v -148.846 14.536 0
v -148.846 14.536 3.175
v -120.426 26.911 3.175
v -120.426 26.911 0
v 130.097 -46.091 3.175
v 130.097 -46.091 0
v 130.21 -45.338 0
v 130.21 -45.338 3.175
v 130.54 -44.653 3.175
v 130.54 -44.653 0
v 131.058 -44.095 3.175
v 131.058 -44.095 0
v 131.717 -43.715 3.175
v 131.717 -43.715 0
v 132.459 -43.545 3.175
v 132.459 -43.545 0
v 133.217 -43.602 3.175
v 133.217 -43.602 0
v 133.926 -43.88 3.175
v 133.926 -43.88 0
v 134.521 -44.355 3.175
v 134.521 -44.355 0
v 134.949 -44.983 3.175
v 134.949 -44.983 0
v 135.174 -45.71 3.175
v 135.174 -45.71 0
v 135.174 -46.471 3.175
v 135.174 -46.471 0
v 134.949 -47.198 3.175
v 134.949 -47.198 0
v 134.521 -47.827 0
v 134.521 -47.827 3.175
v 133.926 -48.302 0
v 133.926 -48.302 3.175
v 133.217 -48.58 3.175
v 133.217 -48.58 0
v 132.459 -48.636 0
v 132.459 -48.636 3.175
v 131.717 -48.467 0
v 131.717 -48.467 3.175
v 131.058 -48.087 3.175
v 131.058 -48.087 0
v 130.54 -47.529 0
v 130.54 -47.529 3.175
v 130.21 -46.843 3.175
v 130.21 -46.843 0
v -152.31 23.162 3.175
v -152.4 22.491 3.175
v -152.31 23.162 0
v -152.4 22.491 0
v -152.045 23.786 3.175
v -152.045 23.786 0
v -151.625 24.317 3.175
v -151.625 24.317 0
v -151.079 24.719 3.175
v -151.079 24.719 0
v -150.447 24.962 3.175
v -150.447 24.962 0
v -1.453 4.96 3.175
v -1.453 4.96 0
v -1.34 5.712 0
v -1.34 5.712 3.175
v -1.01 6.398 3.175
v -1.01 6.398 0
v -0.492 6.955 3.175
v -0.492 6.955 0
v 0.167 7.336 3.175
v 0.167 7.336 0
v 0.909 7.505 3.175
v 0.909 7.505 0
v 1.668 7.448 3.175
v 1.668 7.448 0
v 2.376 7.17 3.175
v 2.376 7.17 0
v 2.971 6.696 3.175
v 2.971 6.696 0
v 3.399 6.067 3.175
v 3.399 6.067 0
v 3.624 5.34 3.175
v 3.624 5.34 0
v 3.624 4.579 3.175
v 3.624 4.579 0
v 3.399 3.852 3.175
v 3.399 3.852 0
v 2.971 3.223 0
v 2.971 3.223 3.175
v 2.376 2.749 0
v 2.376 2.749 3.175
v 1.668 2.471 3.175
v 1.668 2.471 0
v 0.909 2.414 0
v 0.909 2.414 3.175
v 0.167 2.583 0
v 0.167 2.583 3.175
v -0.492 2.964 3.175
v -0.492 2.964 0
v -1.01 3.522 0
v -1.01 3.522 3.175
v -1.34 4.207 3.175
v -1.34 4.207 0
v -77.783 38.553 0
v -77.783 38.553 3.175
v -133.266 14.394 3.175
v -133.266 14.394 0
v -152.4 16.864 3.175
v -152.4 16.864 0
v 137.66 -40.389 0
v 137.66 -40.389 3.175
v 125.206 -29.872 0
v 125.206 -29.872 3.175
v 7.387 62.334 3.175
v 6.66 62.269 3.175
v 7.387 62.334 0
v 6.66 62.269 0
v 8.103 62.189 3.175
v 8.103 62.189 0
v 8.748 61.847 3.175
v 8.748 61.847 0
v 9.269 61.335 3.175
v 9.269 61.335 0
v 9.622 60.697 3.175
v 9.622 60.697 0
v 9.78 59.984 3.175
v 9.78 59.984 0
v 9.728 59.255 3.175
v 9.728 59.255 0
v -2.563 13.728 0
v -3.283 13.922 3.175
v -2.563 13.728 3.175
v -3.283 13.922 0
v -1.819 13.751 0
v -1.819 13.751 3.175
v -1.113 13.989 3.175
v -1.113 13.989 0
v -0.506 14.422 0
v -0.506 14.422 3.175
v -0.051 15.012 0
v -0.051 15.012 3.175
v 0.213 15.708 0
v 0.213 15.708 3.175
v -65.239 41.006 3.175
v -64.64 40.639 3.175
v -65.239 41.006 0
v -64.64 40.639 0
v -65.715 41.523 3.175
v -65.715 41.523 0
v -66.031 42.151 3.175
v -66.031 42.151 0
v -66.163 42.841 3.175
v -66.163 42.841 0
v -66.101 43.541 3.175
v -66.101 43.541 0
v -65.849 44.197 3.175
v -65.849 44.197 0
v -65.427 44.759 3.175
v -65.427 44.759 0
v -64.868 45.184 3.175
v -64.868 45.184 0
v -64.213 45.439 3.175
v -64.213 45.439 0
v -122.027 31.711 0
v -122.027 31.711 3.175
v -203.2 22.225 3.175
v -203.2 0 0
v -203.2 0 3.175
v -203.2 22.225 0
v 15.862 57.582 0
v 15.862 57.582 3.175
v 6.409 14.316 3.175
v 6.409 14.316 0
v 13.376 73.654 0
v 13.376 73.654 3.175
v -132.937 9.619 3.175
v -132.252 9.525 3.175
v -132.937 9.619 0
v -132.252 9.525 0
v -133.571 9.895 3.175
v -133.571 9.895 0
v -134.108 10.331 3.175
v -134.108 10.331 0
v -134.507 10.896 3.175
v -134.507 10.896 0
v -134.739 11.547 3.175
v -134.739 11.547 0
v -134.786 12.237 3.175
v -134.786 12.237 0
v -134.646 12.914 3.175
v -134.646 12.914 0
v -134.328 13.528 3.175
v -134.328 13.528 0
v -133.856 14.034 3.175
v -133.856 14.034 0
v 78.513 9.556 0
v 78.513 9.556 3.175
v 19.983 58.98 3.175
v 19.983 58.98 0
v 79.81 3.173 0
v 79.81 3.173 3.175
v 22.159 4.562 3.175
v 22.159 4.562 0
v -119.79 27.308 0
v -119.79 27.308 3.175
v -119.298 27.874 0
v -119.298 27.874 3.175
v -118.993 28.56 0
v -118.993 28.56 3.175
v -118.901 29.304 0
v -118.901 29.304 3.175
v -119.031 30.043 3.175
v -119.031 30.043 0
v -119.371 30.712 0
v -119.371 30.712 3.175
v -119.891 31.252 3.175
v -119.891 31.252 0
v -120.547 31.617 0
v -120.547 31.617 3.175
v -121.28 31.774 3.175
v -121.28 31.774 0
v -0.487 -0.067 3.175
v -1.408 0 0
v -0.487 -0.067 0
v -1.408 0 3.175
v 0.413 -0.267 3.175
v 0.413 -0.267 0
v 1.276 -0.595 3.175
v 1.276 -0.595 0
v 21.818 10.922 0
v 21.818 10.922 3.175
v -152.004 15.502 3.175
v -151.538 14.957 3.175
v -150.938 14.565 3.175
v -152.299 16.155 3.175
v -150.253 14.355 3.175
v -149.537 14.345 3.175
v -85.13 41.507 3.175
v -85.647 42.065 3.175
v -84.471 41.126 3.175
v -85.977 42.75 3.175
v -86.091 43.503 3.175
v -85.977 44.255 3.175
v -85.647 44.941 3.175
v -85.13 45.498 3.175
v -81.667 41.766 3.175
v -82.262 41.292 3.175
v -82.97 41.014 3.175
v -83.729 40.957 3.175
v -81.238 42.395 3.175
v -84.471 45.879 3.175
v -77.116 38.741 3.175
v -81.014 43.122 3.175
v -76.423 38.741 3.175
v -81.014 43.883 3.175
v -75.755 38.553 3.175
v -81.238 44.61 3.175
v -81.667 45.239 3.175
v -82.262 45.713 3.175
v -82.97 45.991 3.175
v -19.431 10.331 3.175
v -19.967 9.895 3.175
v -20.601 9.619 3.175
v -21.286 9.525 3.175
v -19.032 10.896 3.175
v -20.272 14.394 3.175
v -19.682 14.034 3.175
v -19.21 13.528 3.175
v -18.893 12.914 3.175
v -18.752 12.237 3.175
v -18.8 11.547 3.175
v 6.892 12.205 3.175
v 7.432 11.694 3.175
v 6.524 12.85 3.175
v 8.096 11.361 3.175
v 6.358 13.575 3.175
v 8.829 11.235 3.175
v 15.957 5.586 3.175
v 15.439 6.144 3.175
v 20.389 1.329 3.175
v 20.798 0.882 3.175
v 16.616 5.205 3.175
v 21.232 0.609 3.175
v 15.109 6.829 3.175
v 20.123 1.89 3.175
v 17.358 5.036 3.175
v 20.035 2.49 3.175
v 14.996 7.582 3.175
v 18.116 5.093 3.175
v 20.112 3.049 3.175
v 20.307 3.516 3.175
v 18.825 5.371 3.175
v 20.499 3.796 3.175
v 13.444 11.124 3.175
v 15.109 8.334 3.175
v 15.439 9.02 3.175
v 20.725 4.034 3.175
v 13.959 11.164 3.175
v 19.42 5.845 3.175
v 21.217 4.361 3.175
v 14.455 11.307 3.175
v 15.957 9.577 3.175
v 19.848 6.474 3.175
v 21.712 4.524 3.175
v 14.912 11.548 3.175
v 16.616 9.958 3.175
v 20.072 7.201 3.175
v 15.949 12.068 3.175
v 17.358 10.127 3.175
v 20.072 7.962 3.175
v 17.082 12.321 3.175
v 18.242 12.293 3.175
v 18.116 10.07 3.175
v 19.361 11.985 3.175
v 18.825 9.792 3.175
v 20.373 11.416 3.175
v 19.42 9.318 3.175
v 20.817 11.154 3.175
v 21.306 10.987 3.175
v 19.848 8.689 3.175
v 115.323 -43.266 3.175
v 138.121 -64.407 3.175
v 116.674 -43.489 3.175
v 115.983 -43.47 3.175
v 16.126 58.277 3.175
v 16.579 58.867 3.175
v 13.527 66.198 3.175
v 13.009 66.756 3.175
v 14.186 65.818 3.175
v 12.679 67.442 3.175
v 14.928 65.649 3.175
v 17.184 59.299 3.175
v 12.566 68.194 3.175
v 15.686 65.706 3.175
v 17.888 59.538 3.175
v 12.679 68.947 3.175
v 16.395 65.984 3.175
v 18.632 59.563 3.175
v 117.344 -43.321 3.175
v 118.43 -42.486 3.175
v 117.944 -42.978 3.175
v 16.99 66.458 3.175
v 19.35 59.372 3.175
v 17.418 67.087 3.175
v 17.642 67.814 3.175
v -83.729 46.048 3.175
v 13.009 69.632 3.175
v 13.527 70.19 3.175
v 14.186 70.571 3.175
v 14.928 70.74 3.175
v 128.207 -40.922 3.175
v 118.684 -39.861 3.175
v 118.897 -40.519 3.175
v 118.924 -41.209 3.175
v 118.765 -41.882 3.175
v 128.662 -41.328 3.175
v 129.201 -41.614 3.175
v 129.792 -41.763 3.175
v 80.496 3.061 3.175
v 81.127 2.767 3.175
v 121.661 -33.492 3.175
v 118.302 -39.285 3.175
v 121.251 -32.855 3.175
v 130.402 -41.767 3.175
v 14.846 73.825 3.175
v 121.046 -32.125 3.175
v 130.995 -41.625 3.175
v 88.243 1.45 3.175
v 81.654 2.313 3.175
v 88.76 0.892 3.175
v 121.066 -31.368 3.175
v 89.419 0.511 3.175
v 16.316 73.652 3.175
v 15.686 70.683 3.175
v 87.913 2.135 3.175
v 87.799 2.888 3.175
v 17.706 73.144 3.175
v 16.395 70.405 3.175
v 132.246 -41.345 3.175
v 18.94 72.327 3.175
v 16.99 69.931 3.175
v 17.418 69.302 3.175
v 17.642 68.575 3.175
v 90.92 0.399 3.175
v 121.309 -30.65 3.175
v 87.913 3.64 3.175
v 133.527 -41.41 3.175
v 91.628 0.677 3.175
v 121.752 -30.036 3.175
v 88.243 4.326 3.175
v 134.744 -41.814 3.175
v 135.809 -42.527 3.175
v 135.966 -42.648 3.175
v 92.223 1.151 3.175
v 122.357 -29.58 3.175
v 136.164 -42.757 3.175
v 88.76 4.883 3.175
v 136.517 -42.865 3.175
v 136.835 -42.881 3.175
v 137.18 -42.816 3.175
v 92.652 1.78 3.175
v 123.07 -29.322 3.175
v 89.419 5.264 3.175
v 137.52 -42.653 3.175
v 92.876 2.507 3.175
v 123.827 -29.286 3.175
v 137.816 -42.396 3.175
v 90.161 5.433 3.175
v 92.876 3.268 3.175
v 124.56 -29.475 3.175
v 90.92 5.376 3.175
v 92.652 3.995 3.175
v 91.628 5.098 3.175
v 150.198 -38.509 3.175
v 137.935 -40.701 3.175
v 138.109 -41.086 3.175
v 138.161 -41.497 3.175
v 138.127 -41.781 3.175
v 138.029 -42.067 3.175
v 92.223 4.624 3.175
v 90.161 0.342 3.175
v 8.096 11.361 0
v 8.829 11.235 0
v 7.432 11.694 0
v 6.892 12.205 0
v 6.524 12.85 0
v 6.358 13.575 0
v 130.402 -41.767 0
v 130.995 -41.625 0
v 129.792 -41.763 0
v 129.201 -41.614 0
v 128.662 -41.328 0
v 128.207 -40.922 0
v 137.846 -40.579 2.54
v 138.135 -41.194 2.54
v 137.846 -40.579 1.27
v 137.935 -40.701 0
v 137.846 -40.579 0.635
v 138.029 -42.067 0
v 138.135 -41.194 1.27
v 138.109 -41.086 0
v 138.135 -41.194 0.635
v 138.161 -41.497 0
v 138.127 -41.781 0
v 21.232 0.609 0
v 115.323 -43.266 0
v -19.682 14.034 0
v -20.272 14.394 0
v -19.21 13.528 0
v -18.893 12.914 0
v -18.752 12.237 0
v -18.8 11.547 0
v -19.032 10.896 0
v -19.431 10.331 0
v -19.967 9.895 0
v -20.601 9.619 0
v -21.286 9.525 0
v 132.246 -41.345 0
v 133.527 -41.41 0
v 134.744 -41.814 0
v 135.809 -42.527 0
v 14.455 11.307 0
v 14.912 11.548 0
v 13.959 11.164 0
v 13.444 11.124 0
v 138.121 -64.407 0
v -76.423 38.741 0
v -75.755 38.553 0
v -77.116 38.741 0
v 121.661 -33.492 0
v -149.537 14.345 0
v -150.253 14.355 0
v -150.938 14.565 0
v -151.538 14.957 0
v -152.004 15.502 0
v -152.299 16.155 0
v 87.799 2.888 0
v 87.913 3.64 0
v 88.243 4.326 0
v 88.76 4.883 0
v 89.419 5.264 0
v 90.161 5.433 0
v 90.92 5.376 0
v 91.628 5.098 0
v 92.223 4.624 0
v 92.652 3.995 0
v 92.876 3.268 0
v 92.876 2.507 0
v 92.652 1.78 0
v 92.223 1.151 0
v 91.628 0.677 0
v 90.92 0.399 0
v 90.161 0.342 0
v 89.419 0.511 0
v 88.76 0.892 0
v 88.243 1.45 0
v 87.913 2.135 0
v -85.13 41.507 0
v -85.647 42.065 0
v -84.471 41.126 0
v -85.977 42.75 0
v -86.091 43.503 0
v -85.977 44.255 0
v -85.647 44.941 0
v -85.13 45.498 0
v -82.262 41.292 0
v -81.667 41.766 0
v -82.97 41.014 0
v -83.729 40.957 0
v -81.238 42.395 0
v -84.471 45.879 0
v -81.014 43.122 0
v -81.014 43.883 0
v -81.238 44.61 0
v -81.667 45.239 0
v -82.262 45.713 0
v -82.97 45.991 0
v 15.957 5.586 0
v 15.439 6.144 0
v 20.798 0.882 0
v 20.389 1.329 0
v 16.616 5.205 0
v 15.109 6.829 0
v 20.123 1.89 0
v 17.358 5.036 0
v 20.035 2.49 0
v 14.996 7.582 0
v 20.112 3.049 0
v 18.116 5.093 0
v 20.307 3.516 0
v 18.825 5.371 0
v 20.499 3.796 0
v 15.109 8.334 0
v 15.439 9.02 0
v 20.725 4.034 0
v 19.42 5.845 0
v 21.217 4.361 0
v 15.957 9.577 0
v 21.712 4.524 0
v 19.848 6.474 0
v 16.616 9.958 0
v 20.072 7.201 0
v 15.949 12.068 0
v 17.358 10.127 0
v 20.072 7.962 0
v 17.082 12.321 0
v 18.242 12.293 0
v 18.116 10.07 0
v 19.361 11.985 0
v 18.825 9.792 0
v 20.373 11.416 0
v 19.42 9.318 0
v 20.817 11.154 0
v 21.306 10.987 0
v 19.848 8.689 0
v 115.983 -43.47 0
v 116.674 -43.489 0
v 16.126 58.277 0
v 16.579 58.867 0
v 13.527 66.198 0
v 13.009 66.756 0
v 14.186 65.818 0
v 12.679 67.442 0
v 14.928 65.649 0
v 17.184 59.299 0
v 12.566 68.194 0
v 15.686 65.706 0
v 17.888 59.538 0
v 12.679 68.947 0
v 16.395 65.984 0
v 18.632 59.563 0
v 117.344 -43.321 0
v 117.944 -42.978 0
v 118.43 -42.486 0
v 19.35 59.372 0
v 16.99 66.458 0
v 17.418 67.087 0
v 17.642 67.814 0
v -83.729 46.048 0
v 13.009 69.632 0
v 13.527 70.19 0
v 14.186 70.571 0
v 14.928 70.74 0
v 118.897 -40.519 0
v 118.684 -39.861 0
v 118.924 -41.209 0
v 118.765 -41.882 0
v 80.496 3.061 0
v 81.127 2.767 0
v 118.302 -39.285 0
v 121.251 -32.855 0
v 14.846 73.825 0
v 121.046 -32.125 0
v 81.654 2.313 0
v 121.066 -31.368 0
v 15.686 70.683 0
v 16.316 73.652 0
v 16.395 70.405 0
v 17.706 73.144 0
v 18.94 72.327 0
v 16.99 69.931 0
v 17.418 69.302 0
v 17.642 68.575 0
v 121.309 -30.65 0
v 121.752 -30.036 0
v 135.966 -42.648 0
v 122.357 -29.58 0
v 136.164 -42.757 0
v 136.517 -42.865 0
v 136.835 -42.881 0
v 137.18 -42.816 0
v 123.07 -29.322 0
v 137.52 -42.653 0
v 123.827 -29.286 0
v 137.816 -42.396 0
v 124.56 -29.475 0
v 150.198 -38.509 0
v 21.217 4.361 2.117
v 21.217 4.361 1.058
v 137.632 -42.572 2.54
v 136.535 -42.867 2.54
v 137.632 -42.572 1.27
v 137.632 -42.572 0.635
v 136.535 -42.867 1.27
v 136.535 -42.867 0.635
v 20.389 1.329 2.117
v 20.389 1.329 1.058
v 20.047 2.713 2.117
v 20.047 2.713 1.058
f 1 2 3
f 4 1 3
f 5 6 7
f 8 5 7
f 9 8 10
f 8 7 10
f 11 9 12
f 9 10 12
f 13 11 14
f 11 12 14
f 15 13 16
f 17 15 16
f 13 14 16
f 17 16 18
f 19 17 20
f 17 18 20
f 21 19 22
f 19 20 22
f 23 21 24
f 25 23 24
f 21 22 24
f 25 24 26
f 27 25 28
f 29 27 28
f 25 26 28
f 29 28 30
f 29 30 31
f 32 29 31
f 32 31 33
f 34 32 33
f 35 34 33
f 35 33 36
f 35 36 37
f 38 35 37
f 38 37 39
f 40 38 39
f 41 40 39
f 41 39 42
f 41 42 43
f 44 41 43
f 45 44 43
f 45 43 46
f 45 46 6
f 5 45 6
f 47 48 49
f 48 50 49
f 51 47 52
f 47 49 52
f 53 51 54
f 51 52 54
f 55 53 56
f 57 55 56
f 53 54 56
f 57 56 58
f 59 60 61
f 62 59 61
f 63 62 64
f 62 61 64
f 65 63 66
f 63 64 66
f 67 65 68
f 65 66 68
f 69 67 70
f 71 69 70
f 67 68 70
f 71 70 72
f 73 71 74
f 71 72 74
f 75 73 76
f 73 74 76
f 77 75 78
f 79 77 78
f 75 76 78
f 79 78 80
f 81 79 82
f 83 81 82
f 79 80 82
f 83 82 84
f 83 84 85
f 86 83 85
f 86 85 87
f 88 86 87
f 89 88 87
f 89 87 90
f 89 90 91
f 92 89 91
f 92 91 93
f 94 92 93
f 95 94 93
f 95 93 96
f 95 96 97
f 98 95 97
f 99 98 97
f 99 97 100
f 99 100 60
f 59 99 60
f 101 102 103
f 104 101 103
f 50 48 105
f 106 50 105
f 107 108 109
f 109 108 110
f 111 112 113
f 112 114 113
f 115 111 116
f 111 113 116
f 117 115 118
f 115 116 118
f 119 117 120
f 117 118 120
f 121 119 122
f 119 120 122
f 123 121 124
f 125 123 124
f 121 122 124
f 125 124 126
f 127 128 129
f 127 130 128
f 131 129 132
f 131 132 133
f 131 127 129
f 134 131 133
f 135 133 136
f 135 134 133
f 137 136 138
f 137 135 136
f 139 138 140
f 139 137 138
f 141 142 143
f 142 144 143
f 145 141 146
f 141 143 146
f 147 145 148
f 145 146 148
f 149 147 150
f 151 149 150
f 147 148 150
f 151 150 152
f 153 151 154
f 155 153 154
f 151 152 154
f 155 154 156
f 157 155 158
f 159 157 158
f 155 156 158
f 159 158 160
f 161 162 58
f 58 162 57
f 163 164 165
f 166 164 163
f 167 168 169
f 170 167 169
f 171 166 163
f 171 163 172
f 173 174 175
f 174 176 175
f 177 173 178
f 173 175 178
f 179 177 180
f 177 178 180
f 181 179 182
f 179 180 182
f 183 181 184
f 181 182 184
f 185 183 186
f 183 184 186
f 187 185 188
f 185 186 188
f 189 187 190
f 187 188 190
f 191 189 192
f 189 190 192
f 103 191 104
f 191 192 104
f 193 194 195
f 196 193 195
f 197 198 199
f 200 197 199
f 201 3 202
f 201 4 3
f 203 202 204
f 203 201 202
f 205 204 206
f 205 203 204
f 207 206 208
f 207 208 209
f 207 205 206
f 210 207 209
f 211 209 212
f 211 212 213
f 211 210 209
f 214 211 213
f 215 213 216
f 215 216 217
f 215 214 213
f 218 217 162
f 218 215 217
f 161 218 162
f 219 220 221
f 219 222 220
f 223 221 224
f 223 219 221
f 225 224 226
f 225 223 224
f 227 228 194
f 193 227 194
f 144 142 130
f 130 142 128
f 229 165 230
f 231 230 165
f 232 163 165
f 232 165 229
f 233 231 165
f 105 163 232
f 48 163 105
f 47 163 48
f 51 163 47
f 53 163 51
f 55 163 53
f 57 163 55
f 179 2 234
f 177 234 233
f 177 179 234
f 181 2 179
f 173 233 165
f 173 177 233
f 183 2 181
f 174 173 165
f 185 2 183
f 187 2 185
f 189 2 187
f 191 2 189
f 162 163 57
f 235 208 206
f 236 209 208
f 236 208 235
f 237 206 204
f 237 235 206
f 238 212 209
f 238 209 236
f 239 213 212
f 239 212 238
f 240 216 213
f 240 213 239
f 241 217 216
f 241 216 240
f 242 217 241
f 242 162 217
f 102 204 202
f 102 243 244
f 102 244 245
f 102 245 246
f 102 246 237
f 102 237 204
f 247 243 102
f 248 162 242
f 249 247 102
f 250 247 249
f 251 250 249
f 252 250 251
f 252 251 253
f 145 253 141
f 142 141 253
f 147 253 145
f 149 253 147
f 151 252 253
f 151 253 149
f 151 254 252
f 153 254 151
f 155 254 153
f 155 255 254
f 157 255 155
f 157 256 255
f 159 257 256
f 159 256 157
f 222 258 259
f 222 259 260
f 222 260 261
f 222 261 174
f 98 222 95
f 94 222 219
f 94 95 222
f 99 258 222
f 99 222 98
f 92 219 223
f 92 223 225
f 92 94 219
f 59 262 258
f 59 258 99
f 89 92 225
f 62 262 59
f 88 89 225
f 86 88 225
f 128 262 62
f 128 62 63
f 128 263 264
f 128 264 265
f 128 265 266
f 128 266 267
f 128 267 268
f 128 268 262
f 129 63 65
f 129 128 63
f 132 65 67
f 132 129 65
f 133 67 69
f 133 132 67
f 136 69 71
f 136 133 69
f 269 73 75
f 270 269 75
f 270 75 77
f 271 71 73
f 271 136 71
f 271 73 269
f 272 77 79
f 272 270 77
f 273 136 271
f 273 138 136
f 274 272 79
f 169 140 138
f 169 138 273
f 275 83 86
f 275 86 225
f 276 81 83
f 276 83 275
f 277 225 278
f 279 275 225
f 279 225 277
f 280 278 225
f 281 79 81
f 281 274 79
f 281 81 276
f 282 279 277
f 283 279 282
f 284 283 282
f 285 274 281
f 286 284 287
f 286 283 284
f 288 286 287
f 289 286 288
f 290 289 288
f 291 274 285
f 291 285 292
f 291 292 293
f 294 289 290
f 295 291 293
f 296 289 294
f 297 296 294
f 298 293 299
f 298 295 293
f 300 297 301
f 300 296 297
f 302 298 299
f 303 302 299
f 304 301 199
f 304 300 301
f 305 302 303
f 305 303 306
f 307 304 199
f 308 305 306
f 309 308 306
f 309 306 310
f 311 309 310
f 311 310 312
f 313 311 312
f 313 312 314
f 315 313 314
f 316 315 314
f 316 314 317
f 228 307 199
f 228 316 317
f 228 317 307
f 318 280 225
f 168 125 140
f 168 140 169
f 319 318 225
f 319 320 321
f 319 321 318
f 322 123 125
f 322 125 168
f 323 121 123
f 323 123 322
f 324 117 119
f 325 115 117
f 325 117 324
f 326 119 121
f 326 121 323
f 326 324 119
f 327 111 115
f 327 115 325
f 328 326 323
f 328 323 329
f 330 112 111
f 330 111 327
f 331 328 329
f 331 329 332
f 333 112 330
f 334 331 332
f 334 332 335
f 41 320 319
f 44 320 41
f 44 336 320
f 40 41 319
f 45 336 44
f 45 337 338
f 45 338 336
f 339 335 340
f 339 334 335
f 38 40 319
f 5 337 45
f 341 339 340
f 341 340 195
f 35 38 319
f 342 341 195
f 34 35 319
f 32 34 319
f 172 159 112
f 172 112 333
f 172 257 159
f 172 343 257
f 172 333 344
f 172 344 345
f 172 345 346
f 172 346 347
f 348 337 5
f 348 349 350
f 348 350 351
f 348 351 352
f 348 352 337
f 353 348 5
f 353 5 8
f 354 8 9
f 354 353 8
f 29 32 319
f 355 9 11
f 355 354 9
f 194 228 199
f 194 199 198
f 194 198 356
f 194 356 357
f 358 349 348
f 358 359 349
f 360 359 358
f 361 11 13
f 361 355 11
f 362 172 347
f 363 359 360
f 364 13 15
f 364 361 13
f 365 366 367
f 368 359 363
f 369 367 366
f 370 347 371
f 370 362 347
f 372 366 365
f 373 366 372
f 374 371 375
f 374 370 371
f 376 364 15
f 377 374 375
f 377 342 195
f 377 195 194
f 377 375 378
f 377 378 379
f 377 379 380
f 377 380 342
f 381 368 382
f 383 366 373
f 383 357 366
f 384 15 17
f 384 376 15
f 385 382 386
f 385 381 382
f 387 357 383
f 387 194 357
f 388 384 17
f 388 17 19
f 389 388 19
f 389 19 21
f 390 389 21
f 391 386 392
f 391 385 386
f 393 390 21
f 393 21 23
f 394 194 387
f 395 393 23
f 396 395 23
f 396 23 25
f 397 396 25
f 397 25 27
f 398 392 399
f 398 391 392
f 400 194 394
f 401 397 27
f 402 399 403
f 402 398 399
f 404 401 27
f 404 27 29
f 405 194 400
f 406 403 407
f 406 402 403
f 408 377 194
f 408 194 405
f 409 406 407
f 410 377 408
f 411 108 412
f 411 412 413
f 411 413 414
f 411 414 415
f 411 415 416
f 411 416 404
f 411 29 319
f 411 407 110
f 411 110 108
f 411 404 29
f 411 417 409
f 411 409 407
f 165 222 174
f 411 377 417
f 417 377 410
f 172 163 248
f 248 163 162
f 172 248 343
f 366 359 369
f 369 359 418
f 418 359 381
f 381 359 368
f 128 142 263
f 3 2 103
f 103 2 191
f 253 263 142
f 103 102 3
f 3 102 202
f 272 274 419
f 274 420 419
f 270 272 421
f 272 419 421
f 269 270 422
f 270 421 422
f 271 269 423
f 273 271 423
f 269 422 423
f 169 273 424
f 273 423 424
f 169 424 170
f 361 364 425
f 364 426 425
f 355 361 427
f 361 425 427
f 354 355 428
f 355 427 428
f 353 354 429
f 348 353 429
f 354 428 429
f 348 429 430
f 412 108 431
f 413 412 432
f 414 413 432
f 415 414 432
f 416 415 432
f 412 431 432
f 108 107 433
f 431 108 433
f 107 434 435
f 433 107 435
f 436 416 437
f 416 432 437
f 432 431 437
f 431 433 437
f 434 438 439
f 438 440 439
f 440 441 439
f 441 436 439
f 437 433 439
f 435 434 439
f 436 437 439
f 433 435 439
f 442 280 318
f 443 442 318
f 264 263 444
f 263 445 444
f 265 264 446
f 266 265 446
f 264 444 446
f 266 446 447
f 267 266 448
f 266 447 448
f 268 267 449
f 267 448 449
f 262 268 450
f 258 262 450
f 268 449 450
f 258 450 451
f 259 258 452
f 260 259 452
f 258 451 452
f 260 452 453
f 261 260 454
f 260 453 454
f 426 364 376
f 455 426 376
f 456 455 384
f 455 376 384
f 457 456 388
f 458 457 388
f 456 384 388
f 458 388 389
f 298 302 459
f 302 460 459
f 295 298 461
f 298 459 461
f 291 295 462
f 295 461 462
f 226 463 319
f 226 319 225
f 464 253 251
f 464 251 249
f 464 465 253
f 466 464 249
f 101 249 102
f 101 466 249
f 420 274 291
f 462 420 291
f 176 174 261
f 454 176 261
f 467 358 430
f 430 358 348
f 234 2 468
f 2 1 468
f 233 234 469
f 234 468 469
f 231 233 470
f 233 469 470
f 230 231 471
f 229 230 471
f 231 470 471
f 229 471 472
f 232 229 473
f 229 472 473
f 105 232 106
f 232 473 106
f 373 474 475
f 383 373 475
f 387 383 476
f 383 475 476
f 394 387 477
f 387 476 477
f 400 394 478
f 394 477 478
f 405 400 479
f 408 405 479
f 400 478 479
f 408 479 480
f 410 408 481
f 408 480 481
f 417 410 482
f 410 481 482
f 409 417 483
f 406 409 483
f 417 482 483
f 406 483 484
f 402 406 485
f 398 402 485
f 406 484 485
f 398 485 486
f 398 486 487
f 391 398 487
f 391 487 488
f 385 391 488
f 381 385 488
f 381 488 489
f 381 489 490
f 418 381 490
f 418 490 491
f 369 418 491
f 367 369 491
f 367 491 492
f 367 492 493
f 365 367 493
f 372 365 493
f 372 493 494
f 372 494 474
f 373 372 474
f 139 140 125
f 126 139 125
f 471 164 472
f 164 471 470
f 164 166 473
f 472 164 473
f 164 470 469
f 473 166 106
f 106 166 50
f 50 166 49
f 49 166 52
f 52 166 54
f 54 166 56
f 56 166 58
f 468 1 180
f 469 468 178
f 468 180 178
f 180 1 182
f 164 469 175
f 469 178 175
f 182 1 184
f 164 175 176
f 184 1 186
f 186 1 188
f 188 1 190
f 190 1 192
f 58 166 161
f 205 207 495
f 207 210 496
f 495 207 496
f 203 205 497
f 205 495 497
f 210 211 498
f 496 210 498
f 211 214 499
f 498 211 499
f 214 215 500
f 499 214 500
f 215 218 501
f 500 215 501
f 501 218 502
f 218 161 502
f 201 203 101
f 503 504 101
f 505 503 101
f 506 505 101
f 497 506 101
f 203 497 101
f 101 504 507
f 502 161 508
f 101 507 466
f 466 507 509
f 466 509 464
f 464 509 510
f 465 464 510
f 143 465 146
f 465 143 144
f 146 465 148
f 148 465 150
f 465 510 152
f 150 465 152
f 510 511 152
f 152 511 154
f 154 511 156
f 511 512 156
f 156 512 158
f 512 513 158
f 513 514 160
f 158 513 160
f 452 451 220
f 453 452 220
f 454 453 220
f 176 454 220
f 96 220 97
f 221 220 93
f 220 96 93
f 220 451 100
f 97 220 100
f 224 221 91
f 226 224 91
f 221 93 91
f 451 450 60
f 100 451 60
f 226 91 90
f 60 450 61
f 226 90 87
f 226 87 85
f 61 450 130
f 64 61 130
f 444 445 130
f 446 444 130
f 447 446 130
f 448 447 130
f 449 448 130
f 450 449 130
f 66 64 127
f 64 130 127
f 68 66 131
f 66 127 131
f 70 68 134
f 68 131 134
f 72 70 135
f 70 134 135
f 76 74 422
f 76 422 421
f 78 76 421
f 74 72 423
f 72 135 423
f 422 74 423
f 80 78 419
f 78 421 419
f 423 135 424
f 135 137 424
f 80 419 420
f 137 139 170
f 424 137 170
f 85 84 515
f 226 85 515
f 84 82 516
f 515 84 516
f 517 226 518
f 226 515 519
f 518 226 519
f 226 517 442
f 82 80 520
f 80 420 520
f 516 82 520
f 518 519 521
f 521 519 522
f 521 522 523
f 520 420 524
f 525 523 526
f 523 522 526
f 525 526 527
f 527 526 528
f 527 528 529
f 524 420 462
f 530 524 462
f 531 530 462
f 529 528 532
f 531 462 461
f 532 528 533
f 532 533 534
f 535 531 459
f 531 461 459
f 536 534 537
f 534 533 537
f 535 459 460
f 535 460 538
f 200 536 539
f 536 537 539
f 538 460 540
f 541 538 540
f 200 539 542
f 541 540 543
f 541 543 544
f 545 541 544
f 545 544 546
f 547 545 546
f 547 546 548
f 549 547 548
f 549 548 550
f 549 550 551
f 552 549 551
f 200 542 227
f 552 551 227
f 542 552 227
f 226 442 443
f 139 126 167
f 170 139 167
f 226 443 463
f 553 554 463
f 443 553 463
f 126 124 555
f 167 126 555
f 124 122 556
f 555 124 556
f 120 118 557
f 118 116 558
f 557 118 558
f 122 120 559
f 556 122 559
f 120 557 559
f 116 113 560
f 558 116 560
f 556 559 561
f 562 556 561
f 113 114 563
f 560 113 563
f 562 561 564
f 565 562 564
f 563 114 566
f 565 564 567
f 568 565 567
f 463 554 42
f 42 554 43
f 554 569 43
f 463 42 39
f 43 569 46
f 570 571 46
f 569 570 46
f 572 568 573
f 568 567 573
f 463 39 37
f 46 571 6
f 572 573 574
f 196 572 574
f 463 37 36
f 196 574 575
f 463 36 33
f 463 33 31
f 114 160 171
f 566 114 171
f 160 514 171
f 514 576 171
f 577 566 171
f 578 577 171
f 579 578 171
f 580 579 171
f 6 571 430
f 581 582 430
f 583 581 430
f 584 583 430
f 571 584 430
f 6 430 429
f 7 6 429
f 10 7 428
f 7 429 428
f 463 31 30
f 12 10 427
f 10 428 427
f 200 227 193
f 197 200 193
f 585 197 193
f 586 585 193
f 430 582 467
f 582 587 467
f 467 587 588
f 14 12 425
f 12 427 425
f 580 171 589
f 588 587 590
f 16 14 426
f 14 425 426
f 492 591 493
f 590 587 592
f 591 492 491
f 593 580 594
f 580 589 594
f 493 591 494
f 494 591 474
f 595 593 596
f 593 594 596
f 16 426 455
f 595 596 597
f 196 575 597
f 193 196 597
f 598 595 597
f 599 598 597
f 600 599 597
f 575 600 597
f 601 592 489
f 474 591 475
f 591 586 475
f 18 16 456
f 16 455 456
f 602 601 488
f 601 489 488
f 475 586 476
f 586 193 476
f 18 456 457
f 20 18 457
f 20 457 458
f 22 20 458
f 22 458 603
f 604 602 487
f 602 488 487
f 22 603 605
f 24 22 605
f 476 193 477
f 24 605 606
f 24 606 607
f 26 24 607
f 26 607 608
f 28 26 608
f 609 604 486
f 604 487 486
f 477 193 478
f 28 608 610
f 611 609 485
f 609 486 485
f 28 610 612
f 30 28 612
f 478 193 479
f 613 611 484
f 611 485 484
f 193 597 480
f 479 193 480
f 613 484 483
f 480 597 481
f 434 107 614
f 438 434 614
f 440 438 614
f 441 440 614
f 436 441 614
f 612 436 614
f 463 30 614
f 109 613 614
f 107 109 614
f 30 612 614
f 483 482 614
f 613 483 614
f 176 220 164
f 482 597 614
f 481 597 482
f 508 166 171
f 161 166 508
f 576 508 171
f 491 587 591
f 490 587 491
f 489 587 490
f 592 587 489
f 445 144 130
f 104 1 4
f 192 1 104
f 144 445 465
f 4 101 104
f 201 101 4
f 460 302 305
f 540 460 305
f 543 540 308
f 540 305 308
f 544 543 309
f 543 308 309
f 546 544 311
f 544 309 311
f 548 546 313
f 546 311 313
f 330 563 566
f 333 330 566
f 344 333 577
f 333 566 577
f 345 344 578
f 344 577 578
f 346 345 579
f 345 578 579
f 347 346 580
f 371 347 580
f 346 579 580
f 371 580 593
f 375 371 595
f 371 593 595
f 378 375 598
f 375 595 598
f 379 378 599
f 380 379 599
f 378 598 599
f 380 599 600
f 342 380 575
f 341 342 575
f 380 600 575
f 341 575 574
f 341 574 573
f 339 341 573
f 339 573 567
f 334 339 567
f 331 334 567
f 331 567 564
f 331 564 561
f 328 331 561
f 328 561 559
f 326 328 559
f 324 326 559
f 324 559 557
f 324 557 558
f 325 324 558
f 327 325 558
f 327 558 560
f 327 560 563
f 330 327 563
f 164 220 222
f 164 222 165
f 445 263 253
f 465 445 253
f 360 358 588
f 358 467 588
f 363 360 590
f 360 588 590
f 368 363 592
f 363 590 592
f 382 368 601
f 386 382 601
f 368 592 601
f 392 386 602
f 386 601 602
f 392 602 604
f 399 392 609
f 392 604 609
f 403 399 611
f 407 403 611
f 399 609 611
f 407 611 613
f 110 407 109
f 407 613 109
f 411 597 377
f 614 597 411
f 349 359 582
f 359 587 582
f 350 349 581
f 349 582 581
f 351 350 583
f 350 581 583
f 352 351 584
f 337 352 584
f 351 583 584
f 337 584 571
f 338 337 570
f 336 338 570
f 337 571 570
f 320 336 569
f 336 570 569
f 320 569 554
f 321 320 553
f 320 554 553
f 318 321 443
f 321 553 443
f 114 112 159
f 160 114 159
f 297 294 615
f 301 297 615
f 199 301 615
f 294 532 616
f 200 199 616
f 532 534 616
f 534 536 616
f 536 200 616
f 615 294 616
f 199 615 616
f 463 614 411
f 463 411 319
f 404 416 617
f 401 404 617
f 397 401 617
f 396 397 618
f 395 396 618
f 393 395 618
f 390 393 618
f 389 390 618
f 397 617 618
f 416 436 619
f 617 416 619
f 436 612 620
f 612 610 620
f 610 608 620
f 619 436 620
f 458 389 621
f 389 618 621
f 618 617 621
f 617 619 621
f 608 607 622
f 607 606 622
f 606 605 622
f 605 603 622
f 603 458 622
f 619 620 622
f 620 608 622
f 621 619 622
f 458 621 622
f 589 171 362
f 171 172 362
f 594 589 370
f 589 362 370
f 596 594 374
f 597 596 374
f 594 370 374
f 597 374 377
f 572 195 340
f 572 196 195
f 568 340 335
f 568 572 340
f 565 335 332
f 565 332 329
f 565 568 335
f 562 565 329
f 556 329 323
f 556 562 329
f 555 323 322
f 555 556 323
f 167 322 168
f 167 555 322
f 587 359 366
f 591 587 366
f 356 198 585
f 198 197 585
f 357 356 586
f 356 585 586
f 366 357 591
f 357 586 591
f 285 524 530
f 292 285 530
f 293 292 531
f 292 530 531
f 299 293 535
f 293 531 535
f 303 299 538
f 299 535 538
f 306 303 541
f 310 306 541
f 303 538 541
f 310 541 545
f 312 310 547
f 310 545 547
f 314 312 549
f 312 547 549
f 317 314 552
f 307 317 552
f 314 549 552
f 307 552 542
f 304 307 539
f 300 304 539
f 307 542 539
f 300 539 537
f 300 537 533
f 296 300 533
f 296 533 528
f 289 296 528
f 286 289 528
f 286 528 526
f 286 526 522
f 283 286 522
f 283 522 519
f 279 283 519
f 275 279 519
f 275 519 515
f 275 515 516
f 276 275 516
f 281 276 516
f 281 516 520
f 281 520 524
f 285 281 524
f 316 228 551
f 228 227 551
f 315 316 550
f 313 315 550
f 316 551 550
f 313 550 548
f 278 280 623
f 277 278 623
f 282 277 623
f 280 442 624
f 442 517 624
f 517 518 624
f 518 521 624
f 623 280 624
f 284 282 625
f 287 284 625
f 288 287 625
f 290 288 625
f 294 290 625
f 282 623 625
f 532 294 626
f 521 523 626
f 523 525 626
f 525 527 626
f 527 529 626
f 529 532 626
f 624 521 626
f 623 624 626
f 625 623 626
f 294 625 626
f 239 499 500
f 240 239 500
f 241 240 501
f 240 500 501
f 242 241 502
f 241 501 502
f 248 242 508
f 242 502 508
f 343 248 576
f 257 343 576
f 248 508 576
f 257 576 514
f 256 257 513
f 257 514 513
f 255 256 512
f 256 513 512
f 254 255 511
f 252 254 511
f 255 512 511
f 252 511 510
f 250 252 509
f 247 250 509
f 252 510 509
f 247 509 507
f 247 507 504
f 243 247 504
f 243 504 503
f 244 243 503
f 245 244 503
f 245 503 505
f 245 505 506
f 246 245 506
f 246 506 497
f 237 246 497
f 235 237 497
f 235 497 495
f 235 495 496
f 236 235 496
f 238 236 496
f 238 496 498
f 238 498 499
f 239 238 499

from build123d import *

# Parameters (mm, degrees)
BOSS_EXTRUDE1_DEPTH    = 3.175
CUT_EXTRUDE1_DEPTH     = 3.175
F_10_CLEARANCE_HOLE1_D = 5.1054
FILLET1_R              = 6.35
FILLET2_R              = 2.54
F_10_CLEARANCE_HOLE2_D = 5.1054
FILLET3_DEPTH          = 3.175
FILLET4_DEPTH          = 3.175


with BuildPart() as part:
    # Sketch1 → Boss-Extrude1 (new body)
    with BuildSketch(Plane.XY):
        Polygon((0, 0), (-203.2, 0), (-203.2, 22.225), (16.492698582, 74.393755743), (150.197623574, -38.509278075), (138.121306744, -64.407023089), align=None)
    extrude(amount=BOSS_EXTRUDE1_DEPTH)

    # Sketch2 → Cut-Extrude1 (cut)
    with BuildSketch(Plane.XY.offset(3.175)):
        with BuildLine():
            ThreePointArc((21.24883588, 4.583754924), (18.61914073, 2.941077903), (15.535547838, 3.265329747))
            Line((15.535547838, 3.265329747), (126.332322757, -48.400054896))
            Line((126.332322757, -48.400054896), (80.920020655, 3.146145486))
            Line((80.920020655, 3.146145486), (21.24883588, 4.583754924))
        make_face()
        with BuildLine():
            Line((137.027076007, -44.215538399), (138.486158755, -41.086525347))
            Line((138.486158755, -41.086525347), (98.909290031, -7.667049227))
            Line((98.909290031, -7.667049227), (129.564314023, -42.462686891))
            ThreePointArc((129.564314023, -42.462686891), (133.738335549, -41.454571408), (137.027076007, -44.215538399))
        make_face()
        Polygon((-0.44732738, 12.687080727), (10.590747216, 63.202397136), (-71.622854337, 43.679757896), align=None)
        Polygon((-76.769135969, 38.994763822), (-144.447250959, 9.525), (-9.091020978, 9.525), align=None)
        Polygon((-94.260732486, 38.304112991), (-152.4, 24.498222921), (-152.4, 12.98794568), align=None)
        with BuildLine():
            Line((78.512994475, 9.555978624), (16.762189587, 61.699556828))
            Line((16.762189587, 61.699556828), (5.751368588, 11.308965438))
            Line((5.751368588, 11.308965438), (14.340754941, 11.102028322))
            ThreePointArc((14.340754941, 11.102028322), (17.662973074, 12.342739027), (20.921588597, 10.943481637))
            Line((20.921588597, 10.943481637), (78.512994475, 9.555978624))
        make_face()
    extrude(amount=-CUT_EXTRUDE1_DEPTH, mode=Mode.SUBTRACT)

    # #10 Clearance Hole1 (through all)
    with Locations(Plane.XY.offset(3.175)):
        with Locations((15.118307034, 68.194276097), (1.099513239, 4.959583716), (90.351919236, 2.887547679), (-83.537983118, 43.502605356)):
            Hole(F_10_CLEARANCE_HOLE1_D / 2)

    # Fillet1
    fillet1_edges = [part.edges().sort_by_distance(p)[0] for p in [
        (0, 0, 1.5875),
        (16.492698582, 74.393755743, 1.5875),
    ]]
    fillet(fillet1_edges, radius=FILLET1_R)

    # Fillet2
    fillet2_edges = [part.edges().sort_by_distance(p)[0] for p in [
        (80.920020655, 3.146145486, 1.5875),
        (126.332322757, -48.400054896, 1.5875),
        (20.921588597, 10.943481637, 1.5875),
        (14.340754941, 11.102028322, 1.5875),
        (5.751368588, 11.308965438, 1.5875),
        (16.762189587, 61.699556828, 1.5875),
        (-0.44732738, 12.687080727, 1.5875),
        (-71.622854337, 43.679757896, 1.5875),
        (10.590747216, 63.202397136, 1.5875),
        (-94.260732486, 38.304112991, 1.5875),
        (-152.4, 12.98794568, 1.5875),
        (-152.4, 24.498222921, 1.5875),
        (129.564314023, -42.462686891, 1.5875),
        (98.909290031, -7.667049227, 1.5875),
        (-76.769135969, 38.994763822, 1.5875),
        (-9.091020978, 9.525, 1.5875),
        (-144.447250959, 9.525, 1.5875),
    ]]
    fillet(fillet2_edges, radius=FILLET2_R)

    # #10 Clearance Hole2 (through all)
    with Locations(Plane.XY.offset(3.175)):
        with Locations((17.54826731, 7.581620583), (132.649356264, -46.090898658)):
            Hole(F_10_CLEARANCE_HOLE2_D / 2)

    # Fillet3: read off the stored shape, not the designer's step
    # Fillet3 outline → Fillet3 (add)
    with BuildSketch(Plane.XY):
        with BuildLine():
            Line((15.535547838, 3.265329747), (21.232159568, 0.608956072))
            add(Edge.make_bspline(
                [(21.232159568, 0.608956072), (19.885857145, 1.236747202), (19.378566273, 2.827814172), (20.725192465, 4.03358552)],
                knots=[0, 0, 0, 0, 0.69383671, 0.69383671, 0.69383671, 0.69383671], degree=3, weights=[1, 0.632112013, 0.519478217, 0.662098611]))
            ThreePointArc((20.725192465, 4.03358552), (18.245689672, 2.870462732), (15.535547838, 3.265329747))
        make_face()
        with BuildLine():
            ThreePointArc((21.24883588, 4.583754924), (20.997999412, 4.298214627), (20.725192465, 4.03358552))
            add(Edge.make_bspline(
                [(20.725192465, 4.03358552), (21.150941215, 4.414801664), (21.664082636, 4.573750721), (22.158575797, 4.561837299)],
                knots=[0.69383671, 0.69383671, 0.69383671, 0.69383671, 1, 1, 1, 1], degree=3, weights=[0.662098611, 0.725031472, 0.837665268, 1]))
            Line((22.158575797, 4.561837299), (21.24883588, 4.583754924))
        make_face()
    extrude(amount=FILLET3_DEPTH)

    # Fillet4: read off the stored shape, not the designer's step
    # Fillet4 outline → Fillet4 (add)
    with BuildSketch(Plane.XY):
        with BuildLine():
            Line((138.486158755, -41.086525347), (137.659679105, -40.38862989))
            add(Edge.make_bspline(
                [(137.659679105, -40.38862989), (137.885417825, -40.579248046), (138.092627638, -40.854150437), (138.228700196, -41.219427367), (138.224361363, -41.647951666), (138.029002465, -42.066900176)],
                knots=[0, 0, 0, 0, 0, 0, 0.431143376, 0.431143376, 0.431143376, 0.431143376, 0.431143376, 0.431143376], degree=5, weights=[1, 0.825460303, 0.688546423, 0.58925836, 0.527596114, 0.503559686]))
            Line((138.029002465, -42.066900176), (138.486158755, -41.086525347))
        make_face()
        with BuildLine():
            Line((137.027076007, -44.215538399), (138.029002465, -42.066900176))
            add(Edge.make_bspline(
                [(138.029002465, -42.066900176), (137.740787916, -42.684978272), (137.186504044, -43.023143687), (136.590787826, -43.018448848), (136.121756233, -42.804773213), (135.808946692, -42.527417975)],
                knots=[0.431143376, 0.431143376, 0.431143376, 0.431143376, 0.431143376, 0.431143376, 1, 1, 1, 1, 1, 1], degree=5, weights=[0.503559686, 0.471845684, 0.505632715, 0.604920778, 0.769709873, 1]))
            ThreePointArc((135.808946692, -42.527417975), (136.511376305, -43.304107052), (137.027076007, -44.215538399))
        make_face()
    extrude(amount=FILLET4_DEPTH)


solid = part.part
